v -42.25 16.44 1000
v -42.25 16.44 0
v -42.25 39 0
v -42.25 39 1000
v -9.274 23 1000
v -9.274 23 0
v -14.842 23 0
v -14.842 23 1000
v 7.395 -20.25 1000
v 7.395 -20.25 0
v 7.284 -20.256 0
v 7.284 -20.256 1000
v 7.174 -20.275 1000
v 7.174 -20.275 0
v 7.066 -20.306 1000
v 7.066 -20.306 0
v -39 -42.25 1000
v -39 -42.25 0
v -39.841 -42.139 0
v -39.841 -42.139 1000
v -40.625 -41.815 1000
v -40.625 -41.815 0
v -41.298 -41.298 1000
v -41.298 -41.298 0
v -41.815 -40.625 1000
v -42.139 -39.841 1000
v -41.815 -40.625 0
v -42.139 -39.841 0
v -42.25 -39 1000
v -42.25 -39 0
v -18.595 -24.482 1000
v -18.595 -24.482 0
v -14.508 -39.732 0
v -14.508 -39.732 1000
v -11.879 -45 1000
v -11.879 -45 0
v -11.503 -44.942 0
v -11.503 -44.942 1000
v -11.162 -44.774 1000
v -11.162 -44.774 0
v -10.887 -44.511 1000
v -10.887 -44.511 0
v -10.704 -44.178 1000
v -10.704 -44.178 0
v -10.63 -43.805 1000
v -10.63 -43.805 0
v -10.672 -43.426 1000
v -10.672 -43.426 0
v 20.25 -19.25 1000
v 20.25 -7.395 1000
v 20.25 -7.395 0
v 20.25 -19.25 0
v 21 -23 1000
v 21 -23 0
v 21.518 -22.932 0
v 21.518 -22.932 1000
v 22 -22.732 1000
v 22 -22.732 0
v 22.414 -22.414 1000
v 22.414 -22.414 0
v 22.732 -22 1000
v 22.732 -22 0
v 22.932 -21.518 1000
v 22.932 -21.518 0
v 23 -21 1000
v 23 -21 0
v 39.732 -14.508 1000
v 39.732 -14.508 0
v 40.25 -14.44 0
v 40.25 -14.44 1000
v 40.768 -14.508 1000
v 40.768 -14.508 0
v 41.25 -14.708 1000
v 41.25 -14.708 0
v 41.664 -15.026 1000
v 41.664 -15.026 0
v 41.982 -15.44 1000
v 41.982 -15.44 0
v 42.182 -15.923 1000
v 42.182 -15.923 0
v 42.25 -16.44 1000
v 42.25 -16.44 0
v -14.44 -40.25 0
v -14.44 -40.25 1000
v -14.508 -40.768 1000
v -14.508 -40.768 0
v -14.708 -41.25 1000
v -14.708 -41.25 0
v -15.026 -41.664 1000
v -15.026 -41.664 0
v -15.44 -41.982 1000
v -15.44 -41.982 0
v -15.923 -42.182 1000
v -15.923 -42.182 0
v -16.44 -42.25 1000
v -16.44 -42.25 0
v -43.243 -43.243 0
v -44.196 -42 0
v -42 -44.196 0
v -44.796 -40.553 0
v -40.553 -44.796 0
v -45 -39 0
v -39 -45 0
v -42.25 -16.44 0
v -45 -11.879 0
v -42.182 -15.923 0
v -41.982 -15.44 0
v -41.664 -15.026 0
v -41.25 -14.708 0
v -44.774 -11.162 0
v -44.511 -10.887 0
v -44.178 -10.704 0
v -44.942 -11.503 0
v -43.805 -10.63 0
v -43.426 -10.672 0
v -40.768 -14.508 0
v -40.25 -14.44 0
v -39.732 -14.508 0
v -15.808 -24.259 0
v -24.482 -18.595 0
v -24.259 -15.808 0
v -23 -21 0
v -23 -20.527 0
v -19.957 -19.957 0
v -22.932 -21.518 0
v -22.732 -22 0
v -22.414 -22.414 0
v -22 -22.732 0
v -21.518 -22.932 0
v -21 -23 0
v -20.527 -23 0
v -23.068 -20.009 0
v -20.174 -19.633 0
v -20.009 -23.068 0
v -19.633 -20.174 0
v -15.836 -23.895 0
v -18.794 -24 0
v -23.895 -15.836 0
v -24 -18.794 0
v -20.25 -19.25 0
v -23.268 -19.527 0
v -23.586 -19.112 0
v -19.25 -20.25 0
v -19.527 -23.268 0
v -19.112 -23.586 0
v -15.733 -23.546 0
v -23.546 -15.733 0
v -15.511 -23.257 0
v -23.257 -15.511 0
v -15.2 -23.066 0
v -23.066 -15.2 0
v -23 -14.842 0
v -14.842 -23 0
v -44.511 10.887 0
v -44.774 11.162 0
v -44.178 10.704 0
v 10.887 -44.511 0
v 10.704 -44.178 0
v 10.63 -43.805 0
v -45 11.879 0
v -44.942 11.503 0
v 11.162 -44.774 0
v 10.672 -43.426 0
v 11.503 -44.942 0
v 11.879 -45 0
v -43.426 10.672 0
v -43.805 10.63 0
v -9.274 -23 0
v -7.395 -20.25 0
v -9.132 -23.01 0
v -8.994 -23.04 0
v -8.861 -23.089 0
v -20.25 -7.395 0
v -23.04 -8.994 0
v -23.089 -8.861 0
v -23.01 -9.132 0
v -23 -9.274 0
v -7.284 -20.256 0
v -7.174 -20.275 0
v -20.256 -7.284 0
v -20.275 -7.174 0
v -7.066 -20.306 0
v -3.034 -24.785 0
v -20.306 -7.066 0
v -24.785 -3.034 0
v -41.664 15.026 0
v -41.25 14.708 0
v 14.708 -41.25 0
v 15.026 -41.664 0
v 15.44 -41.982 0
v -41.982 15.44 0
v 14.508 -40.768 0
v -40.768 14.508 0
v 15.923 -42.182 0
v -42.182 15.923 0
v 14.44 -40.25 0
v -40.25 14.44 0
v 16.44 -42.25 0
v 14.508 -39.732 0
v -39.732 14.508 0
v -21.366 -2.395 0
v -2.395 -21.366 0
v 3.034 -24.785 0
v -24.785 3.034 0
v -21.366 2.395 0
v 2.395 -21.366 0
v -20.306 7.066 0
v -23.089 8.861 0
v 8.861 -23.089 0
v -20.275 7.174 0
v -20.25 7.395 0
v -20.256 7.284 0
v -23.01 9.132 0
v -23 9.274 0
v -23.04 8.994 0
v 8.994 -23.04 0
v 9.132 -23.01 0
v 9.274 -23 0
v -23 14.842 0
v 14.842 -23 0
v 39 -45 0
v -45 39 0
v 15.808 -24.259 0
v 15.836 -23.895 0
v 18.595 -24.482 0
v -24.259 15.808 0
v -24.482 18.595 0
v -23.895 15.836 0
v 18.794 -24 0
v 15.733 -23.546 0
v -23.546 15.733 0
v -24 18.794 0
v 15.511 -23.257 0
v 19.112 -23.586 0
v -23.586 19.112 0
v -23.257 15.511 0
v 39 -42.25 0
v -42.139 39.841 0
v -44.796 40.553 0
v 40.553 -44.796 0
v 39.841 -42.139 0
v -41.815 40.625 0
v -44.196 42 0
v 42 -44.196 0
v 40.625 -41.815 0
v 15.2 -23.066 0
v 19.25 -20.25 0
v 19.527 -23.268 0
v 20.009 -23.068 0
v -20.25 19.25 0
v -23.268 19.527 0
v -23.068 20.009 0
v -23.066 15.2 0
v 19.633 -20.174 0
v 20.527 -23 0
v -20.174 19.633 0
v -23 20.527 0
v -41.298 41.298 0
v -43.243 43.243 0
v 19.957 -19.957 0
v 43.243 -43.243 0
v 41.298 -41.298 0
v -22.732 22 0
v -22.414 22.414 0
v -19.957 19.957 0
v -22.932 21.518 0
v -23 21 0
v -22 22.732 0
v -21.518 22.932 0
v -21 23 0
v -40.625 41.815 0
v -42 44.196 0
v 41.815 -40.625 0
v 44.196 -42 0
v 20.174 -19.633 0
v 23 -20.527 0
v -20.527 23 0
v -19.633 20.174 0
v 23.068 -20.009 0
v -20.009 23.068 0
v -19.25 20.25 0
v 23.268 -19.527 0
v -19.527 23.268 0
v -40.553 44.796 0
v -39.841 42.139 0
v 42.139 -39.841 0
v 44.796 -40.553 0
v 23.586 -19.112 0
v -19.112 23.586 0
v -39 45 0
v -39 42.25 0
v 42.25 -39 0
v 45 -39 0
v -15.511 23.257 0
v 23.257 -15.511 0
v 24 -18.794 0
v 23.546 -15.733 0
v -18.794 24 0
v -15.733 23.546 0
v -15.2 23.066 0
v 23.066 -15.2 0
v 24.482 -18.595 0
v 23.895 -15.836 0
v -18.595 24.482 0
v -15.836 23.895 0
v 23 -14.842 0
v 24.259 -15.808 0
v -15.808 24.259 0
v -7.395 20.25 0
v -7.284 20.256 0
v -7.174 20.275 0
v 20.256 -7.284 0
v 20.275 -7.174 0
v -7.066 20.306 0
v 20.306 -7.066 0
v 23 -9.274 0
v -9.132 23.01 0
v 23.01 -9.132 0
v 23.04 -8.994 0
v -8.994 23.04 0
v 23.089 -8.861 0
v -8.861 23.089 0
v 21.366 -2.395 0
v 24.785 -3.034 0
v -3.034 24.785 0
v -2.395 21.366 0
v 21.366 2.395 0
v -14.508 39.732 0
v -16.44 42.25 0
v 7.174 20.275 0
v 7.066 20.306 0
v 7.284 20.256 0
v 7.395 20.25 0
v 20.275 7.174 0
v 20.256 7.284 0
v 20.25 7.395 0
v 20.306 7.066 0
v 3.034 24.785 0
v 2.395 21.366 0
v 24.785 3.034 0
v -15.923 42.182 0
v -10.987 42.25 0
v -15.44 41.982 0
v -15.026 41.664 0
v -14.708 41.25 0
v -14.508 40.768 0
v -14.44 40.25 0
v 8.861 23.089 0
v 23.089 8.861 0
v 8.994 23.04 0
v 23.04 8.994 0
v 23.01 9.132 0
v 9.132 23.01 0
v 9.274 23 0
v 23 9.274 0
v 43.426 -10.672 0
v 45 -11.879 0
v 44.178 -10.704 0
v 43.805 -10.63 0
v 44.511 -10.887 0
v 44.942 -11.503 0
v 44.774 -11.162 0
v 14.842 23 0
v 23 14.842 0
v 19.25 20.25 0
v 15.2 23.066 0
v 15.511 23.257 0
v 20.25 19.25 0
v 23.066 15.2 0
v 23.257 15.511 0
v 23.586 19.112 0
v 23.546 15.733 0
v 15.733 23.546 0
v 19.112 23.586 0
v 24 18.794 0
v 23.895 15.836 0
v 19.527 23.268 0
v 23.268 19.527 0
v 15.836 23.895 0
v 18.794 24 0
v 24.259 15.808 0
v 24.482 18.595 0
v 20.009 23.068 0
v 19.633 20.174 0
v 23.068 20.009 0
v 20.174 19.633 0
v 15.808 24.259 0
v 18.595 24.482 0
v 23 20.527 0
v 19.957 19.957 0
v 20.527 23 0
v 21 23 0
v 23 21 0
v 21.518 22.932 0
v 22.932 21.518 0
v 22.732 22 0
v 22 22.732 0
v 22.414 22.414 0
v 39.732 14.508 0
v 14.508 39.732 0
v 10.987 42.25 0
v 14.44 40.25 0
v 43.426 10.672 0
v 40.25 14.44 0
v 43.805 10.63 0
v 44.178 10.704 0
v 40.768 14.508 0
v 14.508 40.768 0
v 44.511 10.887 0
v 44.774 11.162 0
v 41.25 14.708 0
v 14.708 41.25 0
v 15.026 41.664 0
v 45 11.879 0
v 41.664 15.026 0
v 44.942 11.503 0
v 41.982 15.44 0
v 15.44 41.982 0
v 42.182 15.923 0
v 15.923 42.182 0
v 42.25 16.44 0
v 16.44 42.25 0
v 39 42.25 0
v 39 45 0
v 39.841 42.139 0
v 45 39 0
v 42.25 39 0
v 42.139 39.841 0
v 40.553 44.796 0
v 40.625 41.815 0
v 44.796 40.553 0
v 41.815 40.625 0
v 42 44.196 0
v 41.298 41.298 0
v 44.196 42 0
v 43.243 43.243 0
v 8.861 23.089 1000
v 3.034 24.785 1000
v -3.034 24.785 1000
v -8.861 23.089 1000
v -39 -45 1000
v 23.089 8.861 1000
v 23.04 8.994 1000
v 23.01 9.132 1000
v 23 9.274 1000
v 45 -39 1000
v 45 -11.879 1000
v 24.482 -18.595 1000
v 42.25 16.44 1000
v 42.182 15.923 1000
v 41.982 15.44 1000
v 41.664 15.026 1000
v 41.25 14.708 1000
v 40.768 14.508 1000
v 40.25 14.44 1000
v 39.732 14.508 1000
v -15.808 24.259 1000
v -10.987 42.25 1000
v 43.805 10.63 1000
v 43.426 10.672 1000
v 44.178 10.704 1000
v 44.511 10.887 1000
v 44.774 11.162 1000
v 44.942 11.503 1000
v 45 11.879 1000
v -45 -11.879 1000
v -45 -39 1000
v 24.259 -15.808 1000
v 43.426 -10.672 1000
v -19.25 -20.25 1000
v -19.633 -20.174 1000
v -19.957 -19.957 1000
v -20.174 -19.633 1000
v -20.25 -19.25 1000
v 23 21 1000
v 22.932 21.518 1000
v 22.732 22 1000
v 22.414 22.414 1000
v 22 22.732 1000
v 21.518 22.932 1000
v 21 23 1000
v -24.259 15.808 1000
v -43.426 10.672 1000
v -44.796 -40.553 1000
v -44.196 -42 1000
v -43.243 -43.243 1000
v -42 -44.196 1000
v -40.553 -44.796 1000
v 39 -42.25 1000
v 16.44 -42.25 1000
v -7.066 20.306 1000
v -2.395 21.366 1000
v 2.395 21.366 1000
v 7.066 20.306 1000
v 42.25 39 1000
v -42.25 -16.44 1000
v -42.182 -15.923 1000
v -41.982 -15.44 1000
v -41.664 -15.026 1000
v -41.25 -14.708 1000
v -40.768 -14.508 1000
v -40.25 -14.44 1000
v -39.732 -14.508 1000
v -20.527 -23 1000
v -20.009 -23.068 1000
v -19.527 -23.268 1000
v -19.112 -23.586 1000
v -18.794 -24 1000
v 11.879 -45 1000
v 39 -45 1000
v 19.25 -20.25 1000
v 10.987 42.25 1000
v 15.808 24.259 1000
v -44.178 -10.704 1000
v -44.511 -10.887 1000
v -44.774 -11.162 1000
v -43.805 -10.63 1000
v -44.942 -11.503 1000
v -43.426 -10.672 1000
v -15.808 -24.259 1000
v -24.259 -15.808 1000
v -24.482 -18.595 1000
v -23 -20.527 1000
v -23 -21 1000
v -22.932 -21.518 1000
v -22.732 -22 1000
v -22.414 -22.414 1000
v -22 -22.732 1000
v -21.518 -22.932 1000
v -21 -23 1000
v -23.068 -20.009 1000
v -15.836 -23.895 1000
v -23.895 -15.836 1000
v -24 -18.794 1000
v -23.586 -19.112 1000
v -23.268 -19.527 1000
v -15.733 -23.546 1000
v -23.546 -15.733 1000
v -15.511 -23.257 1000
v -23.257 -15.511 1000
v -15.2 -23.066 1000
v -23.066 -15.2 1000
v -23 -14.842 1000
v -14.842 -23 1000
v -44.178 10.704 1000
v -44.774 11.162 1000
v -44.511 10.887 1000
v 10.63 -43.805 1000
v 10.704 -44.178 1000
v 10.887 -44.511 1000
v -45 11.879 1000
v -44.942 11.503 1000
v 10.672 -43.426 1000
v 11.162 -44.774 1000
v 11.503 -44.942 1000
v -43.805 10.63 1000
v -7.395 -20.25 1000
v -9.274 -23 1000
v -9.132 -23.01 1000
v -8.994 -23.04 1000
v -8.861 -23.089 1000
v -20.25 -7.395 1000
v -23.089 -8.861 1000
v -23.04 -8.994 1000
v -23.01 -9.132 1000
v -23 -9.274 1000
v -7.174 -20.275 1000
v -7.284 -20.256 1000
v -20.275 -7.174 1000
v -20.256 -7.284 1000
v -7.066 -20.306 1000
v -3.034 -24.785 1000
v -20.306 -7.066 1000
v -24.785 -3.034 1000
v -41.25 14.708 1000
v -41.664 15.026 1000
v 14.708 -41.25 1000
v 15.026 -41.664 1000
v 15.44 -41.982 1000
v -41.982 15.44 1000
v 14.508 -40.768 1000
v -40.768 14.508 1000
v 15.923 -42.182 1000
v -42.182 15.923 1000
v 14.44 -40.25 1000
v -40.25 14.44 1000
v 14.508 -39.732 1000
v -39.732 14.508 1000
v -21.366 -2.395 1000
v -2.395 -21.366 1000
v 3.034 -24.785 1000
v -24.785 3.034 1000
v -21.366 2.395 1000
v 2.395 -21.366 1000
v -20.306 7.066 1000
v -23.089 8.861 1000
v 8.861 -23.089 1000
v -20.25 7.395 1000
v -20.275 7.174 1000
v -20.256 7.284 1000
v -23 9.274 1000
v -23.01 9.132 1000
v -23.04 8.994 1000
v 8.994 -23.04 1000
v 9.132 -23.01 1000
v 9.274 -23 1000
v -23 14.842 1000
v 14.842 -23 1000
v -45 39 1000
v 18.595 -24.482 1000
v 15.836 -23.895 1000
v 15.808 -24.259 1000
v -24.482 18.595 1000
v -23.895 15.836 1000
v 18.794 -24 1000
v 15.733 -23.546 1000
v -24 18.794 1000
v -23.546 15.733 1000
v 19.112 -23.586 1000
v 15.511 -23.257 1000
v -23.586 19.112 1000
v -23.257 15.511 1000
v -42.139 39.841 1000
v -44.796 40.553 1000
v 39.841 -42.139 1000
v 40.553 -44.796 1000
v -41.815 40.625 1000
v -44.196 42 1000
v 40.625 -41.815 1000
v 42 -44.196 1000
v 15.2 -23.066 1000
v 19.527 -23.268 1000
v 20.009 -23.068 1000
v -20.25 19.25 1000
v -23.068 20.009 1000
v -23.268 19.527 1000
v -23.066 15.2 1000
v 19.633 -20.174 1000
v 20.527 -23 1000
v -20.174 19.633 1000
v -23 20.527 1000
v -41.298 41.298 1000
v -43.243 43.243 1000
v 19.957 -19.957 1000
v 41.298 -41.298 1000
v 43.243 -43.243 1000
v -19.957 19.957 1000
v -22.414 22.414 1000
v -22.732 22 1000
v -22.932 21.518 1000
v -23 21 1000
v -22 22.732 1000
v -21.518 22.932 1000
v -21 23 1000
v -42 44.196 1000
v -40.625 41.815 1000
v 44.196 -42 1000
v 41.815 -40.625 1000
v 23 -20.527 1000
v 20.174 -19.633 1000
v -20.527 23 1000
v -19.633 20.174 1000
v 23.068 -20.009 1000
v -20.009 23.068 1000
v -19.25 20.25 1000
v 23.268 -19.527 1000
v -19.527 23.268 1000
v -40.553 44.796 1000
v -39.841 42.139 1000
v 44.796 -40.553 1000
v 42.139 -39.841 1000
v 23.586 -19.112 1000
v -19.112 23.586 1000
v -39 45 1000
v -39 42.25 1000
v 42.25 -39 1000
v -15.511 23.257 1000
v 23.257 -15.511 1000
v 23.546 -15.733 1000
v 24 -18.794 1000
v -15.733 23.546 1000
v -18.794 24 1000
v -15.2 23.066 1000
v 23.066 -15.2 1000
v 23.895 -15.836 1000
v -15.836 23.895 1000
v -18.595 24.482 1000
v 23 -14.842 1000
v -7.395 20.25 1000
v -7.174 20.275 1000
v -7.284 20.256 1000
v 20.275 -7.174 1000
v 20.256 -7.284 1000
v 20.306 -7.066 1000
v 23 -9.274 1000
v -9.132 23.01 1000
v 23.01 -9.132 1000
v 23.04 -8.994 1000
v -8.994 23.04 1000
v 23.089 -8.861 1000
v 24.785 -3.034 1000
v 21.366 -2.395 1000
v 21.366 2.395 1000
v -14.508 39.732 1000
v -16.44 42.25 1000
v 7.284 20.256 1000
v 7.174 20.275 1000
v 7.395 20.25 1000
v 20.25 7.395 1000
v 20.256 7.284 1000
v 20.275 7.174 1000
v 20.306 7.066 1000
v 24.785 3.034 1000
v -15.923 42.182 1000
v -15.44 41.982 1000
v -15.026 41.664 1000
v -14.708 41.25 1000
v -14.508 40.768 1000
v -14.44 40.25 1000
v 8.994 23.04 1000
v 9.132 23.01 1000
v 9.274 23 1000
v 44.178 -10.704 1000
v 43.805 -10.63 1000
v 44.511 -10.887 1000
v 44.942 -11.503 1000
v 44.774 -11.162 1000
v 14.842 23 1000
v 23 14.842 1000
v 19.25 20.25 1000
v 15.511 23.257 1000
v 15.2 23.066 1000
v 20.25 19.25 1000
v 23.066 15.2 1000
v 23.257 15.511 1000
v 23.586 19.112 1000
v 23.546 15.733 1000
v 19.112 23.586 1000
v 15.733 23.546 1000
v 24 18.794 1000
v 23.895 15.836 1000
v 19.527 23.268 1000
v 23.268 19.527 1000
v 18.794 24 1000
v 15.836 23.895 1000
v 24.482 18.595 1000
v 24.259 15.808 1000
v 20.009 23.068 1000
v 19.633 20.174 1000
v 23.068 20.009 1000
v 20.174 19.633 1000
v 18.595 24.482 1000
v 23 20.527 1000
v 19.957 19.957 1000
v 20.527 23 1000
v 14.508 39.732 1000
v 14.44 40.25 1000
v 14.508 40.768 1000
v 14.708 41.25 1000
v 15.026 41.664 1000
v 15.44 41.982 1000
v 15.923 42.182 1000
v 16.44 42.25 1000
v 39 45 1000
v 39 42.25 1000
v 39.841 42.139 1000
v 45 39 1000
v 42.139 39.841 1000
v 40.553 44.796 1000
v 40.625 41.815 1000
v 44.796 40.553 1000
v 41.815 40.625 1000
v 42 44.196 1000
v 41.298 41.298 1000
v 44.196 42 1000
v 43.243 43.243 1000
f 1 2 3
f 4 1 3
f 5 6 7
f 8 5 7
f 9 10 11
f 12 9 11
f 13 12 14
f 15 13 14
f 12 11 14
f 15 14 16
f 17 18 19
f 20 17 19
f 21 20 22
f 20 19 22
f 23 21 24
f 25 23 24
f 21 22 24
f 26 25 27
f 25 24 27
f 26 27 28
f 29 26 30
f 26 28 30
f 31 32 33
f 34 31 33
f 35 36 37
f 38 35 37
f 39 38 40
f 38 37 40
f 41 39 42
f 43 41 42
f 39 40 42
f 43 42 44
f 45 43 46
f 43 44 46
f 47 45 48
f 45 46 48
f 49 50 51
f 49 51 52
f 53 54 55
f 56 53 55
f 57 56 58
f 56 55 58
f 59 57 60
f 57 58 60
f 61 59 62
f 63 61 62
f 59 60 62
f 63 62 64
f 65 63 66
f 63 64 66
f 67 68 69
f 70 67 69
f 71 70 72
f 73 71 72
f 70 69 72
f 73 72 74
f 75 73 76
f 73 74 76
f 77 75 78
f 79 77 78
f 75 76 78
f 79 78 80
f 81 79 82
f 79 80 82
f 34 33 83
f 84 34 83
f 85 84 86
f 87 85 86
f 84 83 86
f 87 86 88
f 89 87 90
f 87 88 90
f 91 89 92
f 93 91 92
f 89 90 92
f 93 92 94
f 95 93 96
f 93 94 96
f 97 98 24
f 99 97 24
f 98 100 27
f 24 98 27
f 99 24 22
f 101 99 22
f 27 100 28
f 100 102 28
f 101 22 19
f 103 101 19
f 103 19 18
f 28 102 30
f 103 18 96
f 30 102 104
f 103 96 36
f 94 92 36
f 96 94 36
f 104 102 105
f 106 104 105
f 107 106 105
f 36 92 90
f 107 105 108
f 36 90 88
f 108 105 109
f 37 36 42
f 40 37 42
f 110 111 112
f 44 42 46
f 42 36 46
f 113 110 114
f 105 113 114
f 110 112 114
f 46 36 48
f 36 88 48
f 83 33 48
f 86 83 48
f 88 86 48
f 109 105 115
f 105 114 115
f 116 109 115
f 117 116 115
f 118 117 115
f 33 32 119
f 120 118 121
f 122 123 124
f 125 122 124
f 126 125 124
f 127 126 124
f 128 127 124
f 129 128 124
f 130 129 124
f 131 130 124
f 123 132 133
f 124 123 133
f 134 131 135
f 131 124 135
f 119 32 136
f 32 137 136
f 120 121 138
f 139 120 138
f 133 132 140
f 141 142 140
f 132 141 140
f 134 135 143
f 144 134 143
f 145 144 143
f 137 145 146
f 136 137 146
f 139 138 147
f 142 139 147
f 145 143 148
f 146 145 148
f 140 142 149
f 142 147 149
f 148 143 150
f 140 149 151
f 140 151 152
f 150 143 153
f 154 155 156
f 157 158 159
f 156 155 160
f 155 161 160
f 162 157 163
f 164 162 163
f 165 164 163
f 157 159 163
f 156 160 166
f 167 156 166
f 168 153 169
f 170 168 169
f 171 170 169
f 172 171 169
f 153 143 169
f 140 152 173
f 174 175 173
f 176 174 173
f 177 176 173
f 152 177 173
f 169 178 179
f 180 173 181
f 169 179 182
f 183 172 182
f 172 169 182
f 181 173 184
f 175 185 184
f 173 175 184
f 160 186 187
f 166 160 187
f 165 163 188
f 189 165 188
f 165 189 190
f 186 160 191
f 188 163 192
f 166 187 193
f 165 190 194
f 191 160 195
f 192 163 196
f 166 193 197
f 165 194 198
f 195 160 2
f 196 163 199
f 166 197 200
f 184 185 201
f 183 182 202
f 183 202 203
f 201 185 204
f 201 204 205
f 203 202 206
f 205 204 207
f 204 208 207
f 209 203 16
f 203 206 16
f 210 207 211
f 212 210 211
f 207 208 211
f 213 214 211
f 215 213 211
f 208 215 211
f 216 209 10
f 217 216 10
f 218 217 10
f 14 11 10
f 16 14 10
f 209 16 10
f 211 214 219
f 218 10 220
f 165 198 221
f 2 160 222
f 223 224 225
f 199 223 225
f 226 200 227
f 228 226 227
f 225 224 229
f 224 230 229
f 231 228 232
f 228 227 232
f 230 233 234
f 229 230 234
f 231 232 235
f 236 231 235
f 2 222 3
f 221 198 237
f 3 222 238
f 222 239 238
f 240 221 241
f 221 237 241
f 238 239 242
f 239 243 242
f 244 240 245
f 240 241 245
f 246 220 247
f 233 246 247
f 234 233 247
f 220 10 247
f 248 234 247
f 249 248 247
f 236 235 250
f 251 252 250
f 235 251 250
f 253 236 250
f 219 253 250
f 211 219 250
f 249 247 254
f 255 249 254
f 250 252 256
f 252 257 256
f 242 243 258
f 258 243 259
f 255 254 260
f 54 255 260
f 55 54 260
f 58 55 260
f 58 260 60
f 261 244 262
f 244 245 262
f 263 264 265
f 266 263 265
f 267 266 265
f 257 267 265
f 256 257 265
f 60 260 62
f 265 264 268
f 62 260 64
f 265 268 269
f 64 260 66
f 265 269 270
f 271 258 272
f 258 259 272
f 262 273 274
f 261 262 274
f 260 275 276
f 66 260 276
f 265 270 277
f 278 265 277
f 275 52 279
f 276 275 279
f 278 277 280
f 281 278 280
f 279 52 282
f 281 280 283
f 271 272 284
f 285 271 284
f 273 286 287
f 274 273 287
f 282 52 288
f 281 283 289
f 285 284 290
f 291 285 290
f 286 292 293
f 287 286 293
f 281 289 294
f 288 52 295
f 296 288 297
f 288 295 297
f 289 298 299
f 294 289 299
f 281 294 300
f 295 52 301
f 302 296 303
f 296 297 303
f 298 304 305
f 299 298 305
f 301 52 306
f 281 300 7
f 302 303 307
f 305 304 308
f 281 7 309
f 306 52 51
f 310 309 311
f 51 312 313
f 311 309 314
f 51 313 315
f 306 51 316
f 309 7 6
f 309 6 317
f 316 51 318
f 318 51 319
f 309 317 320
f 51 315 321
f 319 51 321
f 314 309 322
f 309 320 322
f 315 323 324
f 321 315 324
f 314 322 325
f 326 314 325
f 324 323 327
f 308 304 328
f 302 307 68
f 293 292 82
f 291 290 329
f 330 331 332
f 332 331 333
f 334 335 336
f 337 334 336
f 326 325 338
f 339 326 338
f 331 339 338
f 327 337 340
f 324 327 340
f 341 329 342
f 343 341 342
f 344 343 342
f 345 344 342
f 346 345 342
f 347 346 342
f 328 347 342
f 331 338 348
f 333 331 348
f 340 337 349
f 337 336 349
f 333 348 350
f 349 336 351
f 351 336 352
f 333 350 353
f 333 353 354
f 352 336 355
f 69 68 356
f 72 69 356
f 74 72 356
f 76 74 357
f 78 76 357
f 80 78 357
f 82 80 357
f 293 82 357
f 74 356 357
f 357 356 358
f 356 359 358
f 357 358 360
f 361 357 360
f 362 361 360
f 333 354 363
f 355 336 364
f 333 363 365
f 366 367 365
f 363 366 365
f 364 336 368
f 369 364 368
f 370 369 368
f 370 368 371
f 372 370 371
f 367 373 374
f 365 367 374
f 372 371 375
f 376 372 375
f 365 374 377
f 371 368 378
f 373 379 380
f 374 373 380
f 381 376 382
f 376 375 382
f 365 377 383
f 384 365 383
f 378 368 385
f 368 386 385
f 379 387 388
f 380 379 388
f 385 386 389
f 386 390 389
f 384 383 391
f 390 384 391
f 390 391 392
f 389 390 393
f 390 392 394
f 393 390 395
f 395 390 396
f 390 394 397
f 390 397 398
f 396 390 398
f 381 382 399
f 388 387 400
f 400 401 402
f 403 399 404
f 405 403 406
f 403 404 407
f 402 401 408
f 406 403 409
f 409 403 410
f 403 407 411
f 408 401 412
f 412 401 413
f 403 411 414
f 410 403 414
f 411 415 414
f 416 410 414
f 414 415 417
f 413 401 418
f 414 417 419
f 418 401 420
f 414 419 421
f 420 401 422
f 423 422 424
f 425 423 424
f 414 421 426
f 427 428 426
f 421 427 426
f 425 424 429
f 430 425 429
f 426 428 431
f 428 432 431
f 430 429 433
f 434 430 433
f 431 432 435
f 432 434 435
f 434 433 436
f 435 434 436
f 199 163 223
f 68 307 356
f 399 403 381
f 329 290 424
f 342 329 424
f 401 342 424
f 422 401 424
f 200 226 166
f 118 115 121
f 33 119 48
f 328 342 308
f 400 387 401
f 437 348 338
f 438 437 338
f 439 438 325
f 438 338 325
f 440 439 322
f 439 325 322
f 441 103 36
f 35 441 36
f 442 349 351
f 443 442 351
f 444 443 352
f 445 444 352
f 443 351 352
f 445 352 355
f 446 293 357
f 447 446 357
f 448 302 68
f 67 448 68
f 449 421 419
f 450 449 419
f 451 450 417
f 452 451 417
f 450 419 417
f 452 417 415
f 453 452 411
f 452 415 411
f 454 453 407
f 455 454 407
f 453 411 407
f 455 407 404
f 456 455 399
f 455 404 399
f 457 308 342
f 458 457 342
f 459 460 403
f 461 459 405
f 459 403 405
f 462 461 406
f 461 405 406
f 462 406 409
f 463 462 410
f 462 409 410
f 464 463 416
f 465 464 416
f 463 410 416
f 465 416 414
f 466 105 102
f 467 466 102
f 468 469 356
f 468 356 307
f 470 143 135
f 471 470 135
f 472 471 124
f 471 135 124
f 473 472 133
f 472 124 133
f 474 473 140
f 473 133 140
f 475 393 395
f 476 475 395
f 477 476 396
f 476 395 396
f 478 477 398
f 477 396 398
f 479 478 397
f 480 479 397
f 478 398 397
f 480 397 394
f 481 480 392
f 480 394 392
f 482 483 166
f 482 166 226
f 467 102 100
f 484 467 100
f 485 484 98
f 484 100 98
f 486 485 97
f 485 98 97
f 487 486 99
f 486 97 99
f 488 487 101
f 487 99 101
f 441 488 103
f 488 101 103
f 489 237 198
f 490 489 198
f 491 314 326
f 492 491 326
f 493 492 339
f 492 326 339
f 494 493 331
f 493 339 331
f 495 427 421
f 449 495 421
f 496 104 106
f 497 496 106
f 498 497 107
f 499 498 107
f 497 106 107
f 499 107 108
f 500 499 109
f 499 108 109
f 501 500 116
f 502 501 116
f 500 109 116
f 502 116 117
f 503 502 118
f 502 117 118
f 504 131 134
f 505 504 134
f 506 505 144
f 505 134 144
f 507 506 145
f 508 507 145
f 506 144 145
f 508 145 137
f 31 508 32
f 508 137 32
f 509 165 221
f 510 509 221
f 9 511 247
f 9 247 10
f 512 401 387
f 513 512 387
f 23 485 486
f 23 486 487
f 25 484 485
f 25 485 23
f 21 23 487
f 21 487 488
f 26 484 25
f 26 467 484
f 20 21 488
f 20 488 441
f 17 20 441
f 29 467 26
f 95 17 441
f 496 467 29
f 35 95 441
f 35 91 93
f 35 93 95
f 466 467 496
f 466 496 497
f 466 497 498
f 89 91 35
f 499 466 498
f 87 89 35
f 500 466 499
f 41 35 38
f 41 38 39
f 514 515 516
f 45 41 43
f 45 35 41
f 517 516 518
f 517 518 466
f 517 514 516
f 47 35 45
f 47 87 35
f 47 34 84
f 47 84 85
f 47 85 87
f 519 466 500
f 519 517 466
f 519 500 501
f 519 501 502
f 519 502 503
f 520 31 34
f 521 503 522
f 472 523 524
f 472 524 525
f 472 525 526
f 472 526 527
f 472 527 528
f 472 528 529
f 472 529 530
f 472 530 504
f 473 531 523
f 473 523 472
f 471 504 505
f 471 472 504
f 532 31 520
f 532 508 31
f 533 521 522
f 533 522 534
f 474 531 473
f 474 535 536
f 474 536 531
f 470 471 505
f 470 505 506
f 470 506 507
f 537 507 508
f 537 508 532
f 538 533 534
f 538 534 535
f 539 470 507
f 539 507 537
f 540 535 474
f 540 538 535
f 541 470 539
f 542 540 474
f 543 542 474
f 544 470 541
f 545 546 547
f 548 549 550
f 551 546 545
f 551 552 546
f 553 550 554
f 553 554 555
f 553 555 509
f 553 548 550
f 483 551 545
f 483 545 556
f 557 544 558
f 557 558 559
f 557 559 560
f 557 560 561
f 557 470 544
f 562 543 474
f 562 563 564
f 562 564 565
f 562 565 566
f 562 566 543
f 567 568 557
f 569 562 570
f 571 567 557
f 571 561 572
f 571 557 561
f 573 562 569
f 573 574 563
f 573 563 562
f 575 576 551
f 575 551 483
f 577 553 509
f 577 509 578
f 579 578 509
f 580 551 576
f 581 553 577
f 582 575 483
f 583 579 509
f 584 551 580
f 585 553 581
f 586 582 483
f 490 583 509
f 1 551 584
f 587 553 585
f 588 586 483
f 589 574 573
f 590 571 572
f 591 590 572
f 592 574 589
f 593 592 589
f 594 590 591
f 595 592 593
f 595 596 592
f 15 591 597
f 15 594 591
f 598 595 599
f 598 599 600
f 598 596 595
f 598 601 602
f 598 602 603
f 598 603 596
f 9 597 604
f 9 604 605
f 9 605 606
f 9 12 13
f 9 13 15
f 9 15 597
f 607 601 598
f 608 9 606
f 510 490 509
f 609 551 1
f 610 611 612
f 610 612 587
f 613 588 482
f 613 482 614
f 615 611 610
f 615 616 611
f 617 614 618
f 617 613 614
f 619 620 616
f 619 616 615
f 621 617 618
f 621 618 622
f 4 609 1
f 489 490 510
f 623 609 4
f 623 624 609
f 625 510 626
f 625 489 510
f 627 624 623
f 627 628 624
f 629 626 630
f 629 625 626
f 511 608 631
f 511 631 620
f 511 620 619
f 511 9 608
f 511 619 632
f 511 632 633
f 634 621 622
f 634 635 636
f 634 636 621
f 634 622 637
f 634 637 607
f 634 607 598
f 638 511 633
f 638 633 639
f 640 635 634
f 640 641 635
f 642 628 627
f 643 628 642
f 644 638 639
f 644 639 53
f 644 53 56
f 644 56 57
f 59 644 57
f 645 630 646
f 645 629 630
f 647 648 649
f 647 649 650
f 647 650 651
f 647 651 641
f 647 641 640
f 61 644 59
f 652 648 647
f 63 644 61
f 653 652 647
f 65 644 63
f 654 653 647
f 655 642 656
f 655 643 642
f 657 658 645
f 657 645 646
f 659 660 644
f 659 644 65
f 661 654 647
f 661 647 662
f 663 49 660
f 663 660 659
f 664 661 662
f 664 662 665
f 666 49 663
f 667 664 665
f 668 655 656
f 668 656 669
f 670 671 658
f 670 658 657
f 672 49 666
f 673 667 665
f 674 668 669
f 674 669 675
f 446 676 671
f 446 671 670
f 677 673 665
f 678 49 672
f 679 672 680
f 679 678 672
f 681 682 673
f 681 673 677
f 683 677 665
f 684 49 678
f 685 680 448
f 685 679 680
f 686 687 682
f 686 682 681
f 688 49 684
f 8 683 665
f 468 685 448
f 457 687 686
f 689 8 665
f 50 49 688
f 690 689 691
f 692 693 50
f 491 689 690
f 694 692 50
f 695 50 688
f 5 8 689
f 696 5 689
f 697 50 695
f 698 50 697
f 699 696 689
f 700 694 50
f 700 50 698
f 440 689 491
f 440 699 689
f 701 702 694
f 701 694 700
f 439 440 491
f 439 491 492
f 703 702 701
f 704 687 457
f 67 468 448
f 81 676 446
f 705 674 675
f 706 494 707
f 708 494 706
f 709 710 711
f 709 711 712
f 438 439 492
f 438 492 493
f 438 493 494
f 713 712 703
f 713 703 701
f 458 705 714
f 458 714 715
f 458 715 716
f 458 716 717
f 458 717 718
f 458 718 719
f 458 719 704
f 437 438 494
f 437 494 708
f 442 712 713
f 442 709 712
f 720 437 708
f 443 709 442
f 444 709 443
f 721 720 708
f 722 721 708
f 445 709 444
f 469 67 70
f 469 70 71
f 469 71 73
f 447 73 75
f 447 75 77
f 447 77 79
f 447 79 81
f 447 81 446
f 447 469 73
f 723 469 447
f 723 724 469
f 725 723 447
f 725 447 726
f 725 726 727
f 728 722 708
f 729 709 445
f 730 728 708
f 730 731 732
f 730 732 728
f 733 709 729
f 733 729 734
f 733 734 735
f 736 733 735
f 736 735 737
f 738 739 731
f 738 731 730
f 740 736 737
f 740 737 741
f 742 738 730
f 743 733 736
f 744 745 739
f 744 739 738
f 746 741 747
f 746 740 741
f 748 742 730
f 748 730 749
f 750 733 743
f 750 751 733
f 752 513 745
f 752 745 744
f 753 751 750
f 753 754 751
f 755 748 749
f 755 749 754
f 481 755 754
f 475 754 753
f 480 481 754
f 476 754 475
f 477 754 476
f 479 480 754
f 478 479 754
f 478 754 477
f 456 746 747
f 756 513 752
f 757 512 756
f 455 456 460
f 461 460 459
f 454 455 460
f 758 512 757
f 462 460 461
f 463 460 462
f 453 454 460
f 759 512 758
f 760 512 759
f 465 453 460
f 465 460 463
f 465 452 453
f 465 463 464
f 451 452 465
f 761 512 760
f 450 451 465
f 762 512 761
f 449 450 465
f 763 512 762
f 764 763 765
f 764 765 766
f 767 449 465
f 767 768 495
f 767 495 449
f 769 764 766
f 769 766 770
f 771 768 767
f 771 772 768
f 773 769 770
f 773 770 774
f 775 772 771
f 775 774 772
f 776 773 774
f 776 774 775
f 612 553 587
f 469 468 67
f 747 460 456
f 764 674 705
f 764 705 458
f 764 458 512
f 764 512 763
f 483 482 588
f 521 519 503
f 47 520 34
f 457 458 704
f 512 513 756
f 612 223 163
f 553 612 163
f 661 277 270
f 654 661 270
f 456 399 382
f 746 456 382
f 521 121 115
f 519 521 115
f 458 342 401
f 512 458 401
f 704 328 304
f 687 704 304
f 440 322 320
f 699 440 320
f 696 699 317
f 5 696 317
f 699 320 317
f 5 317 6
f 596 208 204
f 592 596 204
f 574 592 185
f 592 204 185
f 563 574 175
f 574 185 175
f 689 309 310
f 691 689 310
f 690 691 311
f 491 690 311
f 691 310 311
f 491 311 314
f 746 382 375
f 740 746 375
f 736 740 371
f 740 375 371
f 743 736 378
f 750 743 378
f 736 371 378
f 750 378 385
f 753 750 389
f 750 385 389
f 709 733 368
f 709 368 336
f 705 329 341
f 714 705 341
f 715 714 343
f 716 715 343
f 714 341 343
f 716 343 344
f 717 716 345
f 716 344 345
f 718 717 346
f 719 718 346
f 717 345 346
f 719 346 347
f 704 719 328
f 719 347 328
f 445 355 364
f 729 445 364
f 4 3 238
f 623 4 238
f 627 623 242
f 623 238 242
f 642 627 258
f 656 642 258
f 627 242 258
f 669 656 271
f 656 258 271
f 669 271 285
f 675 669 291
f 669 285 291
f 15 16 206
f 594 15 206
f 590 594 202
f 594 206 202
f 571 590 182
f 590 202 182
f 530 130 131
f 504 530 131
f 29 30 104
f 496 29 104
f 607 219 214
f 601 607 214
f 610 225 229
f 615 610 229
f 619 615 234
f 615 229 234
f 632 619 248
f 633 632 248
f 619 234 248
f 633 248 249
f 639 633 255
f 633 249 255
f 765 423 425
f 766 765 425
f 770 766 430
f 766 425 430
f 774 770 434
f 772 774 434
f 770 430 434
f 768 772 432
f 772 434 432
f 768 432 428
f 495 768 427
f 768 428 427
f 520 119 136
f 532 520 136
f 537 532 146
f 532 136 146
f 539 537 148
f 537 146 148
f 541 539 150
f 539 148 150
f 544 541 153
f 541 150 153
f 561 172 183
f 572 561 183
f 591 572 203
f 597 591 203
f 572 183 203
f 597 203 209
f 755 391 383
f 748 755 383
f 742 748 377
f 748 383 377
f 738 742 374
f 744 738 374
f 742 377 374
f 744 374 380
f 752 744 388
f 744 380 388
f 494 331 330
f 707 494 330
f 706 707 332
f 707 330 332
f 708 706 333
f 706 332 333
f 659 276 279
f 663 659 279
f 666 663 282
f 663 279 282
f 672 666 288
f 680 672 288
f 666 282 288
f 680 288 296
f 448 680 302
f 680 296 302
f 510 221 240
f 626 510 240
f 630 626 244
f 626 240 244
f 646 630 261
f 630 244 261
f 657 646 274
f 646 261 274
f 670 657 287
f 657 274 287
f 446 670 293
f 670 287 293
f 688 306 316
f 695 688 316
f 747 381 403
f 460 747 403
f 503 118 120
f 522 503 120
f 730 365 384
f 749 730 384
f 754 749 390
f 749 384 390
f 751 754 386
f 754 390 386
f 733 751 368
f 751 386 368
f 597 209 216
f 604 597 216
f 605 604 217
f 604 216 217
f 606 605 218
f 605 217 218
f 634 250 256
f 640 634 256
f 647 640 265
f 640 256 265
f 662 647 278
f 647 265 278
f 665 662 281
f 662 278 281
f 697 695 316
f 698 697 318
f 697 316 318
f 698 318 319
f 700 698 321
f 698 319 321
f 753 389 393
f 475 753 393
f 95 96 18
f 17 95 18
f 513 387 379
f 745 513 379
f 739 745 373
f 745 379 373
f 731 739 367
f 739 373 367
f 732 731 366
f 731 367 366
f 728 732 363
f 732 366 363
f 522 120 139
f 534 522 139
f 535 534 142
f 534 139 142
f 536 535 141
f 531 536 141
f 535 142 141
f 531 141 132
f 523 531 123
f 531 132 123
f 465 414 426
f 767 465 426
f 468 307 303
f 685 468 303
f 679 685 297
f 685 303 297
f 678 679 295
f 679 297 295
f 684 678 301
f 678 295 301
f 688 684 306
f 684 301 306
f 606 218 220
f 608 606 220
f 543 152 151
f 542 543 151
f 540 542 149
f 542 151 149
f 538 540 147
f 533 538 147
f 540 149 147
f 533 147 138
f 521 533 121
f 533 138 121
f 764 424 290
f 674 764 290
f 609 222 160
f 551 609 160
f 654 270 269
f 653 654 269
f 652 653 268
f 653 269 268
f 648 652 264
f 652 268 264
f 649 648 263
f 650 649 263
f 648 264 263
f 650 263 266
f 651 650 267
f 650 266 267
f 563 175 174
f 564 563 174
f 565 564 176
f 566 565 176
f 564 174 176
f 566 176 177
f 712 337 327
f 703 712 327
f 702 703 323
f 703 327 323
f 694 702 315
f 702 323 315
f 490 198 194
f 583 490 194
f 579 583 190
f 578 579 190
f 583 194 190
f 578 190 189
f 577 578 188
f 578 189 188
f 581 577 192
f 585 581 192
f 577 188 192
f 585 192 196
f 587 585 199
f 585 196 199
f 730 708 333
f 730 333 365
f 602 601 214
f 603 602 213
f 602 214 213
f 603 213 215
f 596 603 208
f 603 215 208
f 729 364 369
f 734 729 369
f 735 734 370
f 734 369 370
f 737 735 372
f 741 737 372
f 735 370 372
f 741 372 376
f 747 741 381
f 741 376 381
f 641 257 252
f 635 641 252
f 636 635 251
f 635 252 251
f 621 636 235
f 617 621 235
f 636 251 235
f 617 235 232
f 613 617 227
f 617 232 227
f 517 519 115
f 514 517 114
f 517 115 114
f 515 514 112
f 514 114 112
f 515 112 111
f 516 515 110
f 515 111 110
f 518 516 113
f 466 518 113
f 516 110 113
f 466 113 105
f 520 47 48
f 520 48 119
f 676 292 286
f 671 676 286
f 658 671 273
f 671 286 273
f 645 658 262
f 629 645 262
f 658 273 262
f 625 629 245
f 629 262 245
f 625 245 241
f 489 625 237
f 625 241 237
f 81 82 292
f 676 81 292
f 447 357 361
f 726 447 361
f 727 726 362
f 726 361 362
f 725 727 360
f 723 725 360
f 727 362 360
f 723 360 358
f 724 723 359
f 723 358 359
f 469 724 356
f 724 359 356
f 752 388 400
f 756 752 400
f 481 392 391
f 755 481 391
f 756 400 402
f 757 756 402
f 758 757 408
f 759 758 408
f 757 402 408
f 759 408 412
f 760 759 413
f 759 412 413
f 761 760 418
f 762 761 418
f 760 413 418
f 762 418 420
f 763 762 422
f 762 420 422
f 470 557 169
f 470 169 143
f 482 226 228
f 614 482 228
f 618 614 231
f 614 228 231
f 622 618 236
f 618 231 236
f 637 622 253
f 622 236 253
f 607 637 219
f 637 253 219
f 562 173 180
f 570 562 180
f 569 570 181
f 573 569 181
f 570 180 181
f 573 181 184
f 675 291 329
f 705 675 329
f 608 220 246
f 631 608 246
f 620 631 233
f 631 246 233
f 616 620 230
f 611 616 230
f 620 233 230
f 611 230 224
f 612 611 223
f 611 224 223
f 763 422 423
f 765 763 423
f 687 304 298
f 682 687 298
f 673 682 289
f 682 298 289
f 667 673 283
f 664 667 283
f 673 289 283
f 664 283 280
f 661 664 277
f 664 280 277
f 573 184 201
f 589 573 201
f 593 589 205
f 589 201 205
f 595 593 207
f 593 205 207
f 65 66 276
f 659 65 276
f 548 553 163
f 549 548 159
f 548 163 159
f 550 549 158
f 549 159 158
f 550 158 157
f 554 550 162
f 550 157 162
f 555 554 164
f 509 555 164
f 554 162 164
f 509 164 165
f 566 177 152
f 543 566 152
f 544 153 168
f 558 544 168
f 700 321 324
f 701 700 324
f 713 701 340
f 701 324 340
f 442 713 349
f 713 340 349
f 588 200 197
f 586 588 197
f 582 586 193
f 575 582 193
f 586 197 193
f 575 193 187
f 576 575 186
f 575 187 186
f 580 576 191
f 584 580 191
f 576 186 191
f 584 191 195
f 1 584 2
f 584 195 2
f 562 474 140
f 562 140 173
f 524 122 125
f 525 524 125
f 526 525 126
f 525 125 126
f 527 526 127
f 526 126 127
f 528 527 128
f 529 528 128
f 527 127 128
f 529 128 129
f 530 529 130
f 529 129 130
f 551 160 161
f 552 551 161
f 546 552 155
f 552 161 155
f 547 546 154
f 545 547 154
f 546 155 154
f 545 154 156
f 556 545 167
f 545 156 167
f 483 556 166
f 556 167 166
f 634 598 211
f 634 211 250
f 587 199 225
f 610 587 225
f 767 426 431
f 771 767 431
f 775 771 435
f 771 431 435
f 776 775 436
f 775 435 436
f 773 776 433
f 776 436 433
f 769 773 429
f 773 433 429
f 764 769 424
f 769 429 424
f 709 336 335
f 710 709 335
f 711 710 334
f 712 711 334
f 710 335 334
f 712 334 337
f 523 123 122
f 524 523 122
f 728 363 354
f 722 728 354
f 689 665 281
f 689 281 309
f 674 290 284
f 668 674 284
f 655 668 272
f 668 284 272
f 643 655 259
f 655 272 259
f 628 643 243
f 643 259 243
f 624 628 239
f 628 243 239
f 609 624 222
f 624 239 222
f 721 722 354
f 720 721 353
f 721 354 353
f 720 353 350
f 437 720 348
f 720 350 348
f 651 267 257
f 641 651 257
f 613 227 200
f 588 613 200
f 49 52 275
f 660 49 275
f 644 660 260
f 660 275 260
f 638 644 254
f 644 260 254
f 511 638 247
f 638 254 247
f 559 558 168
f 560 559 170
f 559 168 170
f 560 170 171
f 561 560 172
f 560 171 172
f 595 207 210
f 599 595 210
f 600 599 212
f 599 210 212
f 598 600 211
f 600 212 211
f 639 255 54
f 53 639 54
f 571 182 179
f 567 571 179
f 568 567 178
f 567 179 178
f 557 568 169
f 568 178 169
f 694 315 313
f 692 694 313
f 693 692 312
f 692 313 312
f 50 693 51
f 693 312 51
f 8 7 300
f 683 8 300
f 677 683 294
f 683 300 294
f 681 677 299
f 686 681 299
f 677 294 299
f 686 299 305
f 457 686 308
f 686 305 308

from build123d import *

# Parameters (mm, degrees)
F1_DEPTH = 1000


# Not quite as in the source:
# - ends of sketch curves that miss each other by under 0.0002 mm in the source are joined


with BuildPart() as f1:
    # F0 (on Top) → F1 (new body)
    with BuildSketch(Plane.XY):
        with BuildLine():
            ThreePointArc((8.8614578186, -23.0888885991), (9.062799833, -23.022474706), (9.273618, -23))
            Line((9.273618, -23), (14.841657, -23))
            ThreePointArc((14.841657, -23), (15.6350103133, -23.3912385359), (15.8075828492, -24.2588189596))
            Line((15.8075828492, -24.2588189596), (10.671624, -43.426476))
            ThreePointArc((10.671624, -43.426476), (10.8873403242, -44.5109517857), (11.879032, -45))
            Line((11.879032, -45), (39, -45))
            ThreePointArc((39, -45), (43.2426406871, -43.2426406871), (45, -39))
            Line((45, -39), (45, -11.879032))
            ThreePointArc((45, -11.879032), (44.5109517857, -10.8873403242), (43.4264761923, -10.6716247175))
            Line((43.4264761923, -10.6716247175), (24.258819, -15.807583))
            ThreePointArc((24.258819, -15.807583), (23.3912385359, -15.6350103133), (23, -14.841657))
            Line((23, -14.841657), (23, -9.273618))
            ThreePointArc((23, -9.273618), (23.022474706, -9.062799833), (23.0888885991, -8.8614578186))
            ThreePointArc((23.0888885991, -8.8614578186), (25, 0), (23.0888887851, 8.8614579028))
            ThreePointArc((23.0888887851, 8.8614579028), (23.022474706, 9.062799833), (23, 9.273618))
            Line((23, 9.273618), (23, 14.841657))
            ThreePointArc((23, 14.841657), (23.3912385359, 15.6350103133), (24.2588189596, 15.8075828492))
            Line((24.2588189596, 15.8075828492), (43.426476, 10.671624))
            ThreePointArc((43.426476, 10.671624), (44.5109517857, 10.8873403242), (45, 11.879032))
            Line((45, 11.879032), (45, 39))
            ThreePointArc((45, 39), (43.2426406871, 43.2426406871), (39, 45))
            Line((39, 45), (-39, 45))
            ThreePointArc((-39, 45), (-43.2426406871, 43.2426406871), (-45, 39))
            Line((-45, 39), (-45, 11.879032))
            ThreePointArc((-45, 11.879032), (-44.5109517857, 10.8873403242), (-43.4264761923, 10.6716247175))
            Line((-43.4264761923, 10.6716247175), (-24.258819, 15.807583))
            ThreePointArc((-24.258819, 15.807583), (-23.3912385359, 15.6350103133), (-23, 14.841657))
            Line((-23, 14.841657), (-23, 9.273618))
            ThreePointArc((-23, 9.273618), (-23.022474706, 9.062799833), (-23.0888885991, 8.8614578186))
            ThreePointArc((-23.0888885991, 8.8614578186), (-25, 0), (-23.0888887851, -8.8614579028))
            ThreePointArc((-23.0888887851, -8.8614579028), (-23.022474706, -9.062799833), (-23, -9.273618))
            Line((-23, -9.273618), (-23, -14.841657))
            ThreePointArc((-23, -14.841657), (-23.3912385359, -15.6350103133), (-24.2588189596, -15.8075828492))
            Line((-24.2588189596, -15.8075828492), (-43.426476, -10.671624))
            ThreePointArc((-43.426476, -10.671624), (-44.5109517857, -10.8873403242), (-45, -11.879032))
            Line((-45, -11.879032), (-45, -39))
            ThreePointArc((-45, -39), (-43.2426406871, -43.2426406871), (-39, -45))
            Line((-39, -45), (-11.879032, -45))
            ThreePointArc((-11.879032, -45), (-10.8873403242, -44.5109517857), (-10.6716247175, -43.4264761923))
            Line((-10.6716247175, -43.4264761923), (-15.807583, -24.258819))
            ThreePointArc((-15.807583, -24.258819), (-15.6350103133, -23.3912385359), (-14.841657, -23))
            Line((-14.841657, -23), (-9.273618, -23))
            ThreePointArc((-9.273618, -23), (-9.062799833, -23.022474706), (-8.8614578186, -23.0888885991))
            ThreePointArc((-8.8614578186, -23.0888885991), (0, -25), (8.8614578186, -23.0888885991))
        make_face()
        with BuildLine():
            Line((-39.732362, -14.508469), (-24.482362, -18.594694))
            ThreePointArc((-24.482362, -18.594694), (-23.4132933733, -19.3090230718), (-23, -20.526546))
            Line((-23, -20.526546), (-23, -21))
            ThreePointArc((-23, -21), (-22.4142135624, -22.4142135624), (-21, -23))
            Line((-21, -23), (-20.526546, -23))
            ThreePointArc((-20.526546, -23), (-19.3090230718, -23.4132933733), (-18.5946943016, -24.4823620808))
            Line((-18.5946943016, -24.4823620808), (-14.508469, -39.732362))
            ThreePointArc((-14.508469, -39.732362), (-14.8536143733, -41.4675229282), (-16.440321, -42.25))
            Line((-16.440321, -42.25), (-39, -42.25))
            ThreePointArc((-39, -42.25), (-41.2980970389, -41.2980970389), (-42.25, -39))
            Line((-42.25, -39), (-42.25, -16.440321))
            ThreePointArc((-42.25, -16.440321), (-41.4675229282, -14.8536143733), (-39.732362, -14.508469))
        make_face(mode=Mode.SUBTRACT)
        with BuildLine():
            Line((14.508469, -39.732362), (18.594694, -24.482362))
            ThreePointArc((18.594694, -24.482362), (19.3090230718, -23.4132933733), (20.526546, -23))
            Line((20.526546, -23), (21, -23))
            ThreePointArc((21, -23), (22.4142135624, -22.4142135624), (23, -21))
            Line((23, -21), (23, -20.526546))
            ThreePointArc((23, -20.526546), (23.4132933733, -19.3090230718), (24.4823620808, -18.5946943016))
            Line((24.4823620808, -18.5946943016), (39.732362, -14.508469))
            ThreePointArc((39.732362, -14.508469), (41.4675229282, -14.8536143733), (42.25, -16.440321))
            Line((42.25, -16.440321), (42.25, -39))
            ThreePointArc((42.25, -39), (41.2980970389, -41.2980970389), (39, -42.25))
            Line((39, -42.25), (16.440321, -42.25))
            ThreePointArc((16.440321, -42.25), (14.8536143733, -41.4675229282), (14.508469, -39.732362))
        make_face(mode=Mode.SUBTRACT)
        with BuildLine():
            Line((-7.3951, -20.25), (-19.25, -20.25))
            ThreePointArc((-19.25, -20.25), (-19.9571067812, -19.9571067812), (-20.25, -19.25))
            Line((-20.25, -19.25), (-20.25, -7.3951))
            ThreePointArc((-20.25, -7.3951), (-20.2639867072, -7.2284333074), (-20.3055555728, -7.0664288513))
            ThreePointArc((-20.3055554887, -7.066428822), (-21.5, 0), (-20.3055554887, 7.066428822))
            ThreePointArc((-20.3055555728, 7.0664288513), (-20.2639867072, 7.2284333074), (-20.25, 7.3951))
            Line((-20.25, 7.3951), (-20.25, 19.25))
            ThreePointArc((-20.25, 19.25), (-19.9571067812, 19.9571067812), (-19.25, 20.25))
            Line((-19.25, 20.25), (-7.3951, 20.25))
            ThreePointArc((-7.3951, 20.25), (-7.2284333074, 20.2639867072), (-7.0664288513, 20.3055555728))
            ThreePointArc((-7.066428822, 20.3055554887), (0, 21.5), (7.066428822, 20.3055554887))
            ThreePointArc((7.0664288513, 20.3055555728), (7.2284333074, 20.2639867072), (7.3951, 20.25))
            Line((7.3951, 20.25), (19.25, 20.25))
            ThreePointArc((19.25, 20.25), (19.9571067812, 19.9571067812), (20.25, 19.25))
            Line((20.25, 19.25), (20.25, 7.3951))
            ThreePointArc((20.25, 7.3951), (20.2639867072, 7.2284333074), (20.3055555728, 7.0664288513))
            ThreePointArc((20.3055554887, 7.066428822), (21.5, 0), (20.3055554887, -7.066428822))
            ThreePointArc((20.3055555728, -7.0664288513), (20.2639867072, -7.2284333074), (20.25, -7.3951))
            Line((20.25, -7.3951), (20.25, -19.25))
            ThreePointArc((20.25, -19.25), (19.9571067812, -19.9571067812), (19.25, -20.25))
            Line((19.25, -20.25), (7.3951, -20.25))
            ThreePointArc((7.3951, -20.25), (7.2284333074, -20.2639867072), (7.0664288513, -20.3055555728))
            ThreePointArc((7.066428822, -20.3055554887), (0, -21.5), (-7.066428822, -20.3055554887))
            ThreePointArc((-7.0664288513, -20.3055555728), (-7.2284333074, -20.2639867072), (-7.3951, -20.25))
        make_face(mode=Mode.SUBTRACT)
        with BuildLine():
            Line((-14.508469, 39.732362), (-18.594694, 24.482362))
            ThreePointArc((-18.594694, 24.482362), (-19.3090230718, 23.4132933733), (-20.526546, 23))
            Line((-20.526546, 23), (-21, 23))
            ThreePointArc((-21, 23), (-22.4142135624, 22.4142135624), (-23, 21))
            Line((-23, 21), (-23, 20.526546))
            ThreePointArc((-23, 20.526546), (-23.4132933733, 19.3090230718), (-24.4823620808, 18.5946943016))
            Line((-24.4823620808, 18.5946943016), (-39.732362, 14.508469))
            ThreePointArc((-39.732362, 14.508469), (-41.4675229282, 14.8536143733), (-42.25, 16.440321))
            Line((-42.25, 16.440321), (-42.25, 39))
            ThreePointArc((-42.25, 39), (-41.2980970389, 41.2980970389), (-39, 42.25))
            Line((-39, 42.25), (-16.440321, 42.25))
            ThreePointArc((-16.440321, 42.25), (-14.8536143733, 41.4675229282), (-14.508469, 39.732362))
        make_face(mode=Mode.SUBTRACT)
        with BuildLine():
            Line((-9.273618, 23), (-14.841657, 23))
            ThreePointArc((-14.841657, 23), (-15.6350103133, 23.3912385359), (-15.8075828492, 24.2588189596))
            Line((-15.8075828492, 24.2588189596), (-10.98686, 42.25))
            Line((-10.98686, 42.25), (10.98686, 42.25))
            Line((10.98686, 42.25), (15.807583, 24.258819))
            ThreePointArc((15.807583, 24.258819), (15.6350103133, 23.3912385359), (14.841657, 23))
            Line((14.841657, 23), (9.273618, 23))
            ThreePointArc((9.273618, 23), (9.062799833, 23.022474706), (8.8614578186, 23.0888885991))
            ThreePointArc((8.8614578186, 23.0888885991), (0, 25), (-8.8614579028, 23.0888887851))
            ThreePointArc((-8.8614579028, 23.0888887851), (-9.062799833, 23.022474706), (-9.273618, 23))
        make_face(mode=Mode.SUBTRACT)
        with BuildLine():
            Line((39.732362, 14.508469), (24.482362, 18.594694))
            ThreePointArc((24.482362, 18.594694), (23.4132933733, 19.3090230718), (23, 20.526546))
            Line((23, 20.526546), (23, 21))
            ThreePointArc((23, 21), (22.4142135624, 22.4142135624), (21, 23))
            Line((21, 23), (20.526546, 23))
            ThreePointArc((20.526546, 23), (19.3090230718, 23.4132933733), (18.5946943016, 24.4823620808))
            Line((18.5946943016, 24.4823620808), (14.508469, 39.732362))
            ThreePointArc((14.508469, 39.732362), (14.8536143733, 41.4675229282), (16.440321, 42.25))
            Line((16.440321, 42.25), (39, 42.25))
            ThreePointArc((39, 42.25), (41.2980970389, 41.2980970389), (42.25, 39))
            Line((42.25, 39), (42.25, 16.440321))
            ThreePointArc((42.25, 16.440321), (41.4675229282, 14.8536143733), (39.732362, 14.508469))
        make_face(mode=Mode.SUBTRACT)
    extrude(amount=F1_DEPTH)


solid = f1.part
